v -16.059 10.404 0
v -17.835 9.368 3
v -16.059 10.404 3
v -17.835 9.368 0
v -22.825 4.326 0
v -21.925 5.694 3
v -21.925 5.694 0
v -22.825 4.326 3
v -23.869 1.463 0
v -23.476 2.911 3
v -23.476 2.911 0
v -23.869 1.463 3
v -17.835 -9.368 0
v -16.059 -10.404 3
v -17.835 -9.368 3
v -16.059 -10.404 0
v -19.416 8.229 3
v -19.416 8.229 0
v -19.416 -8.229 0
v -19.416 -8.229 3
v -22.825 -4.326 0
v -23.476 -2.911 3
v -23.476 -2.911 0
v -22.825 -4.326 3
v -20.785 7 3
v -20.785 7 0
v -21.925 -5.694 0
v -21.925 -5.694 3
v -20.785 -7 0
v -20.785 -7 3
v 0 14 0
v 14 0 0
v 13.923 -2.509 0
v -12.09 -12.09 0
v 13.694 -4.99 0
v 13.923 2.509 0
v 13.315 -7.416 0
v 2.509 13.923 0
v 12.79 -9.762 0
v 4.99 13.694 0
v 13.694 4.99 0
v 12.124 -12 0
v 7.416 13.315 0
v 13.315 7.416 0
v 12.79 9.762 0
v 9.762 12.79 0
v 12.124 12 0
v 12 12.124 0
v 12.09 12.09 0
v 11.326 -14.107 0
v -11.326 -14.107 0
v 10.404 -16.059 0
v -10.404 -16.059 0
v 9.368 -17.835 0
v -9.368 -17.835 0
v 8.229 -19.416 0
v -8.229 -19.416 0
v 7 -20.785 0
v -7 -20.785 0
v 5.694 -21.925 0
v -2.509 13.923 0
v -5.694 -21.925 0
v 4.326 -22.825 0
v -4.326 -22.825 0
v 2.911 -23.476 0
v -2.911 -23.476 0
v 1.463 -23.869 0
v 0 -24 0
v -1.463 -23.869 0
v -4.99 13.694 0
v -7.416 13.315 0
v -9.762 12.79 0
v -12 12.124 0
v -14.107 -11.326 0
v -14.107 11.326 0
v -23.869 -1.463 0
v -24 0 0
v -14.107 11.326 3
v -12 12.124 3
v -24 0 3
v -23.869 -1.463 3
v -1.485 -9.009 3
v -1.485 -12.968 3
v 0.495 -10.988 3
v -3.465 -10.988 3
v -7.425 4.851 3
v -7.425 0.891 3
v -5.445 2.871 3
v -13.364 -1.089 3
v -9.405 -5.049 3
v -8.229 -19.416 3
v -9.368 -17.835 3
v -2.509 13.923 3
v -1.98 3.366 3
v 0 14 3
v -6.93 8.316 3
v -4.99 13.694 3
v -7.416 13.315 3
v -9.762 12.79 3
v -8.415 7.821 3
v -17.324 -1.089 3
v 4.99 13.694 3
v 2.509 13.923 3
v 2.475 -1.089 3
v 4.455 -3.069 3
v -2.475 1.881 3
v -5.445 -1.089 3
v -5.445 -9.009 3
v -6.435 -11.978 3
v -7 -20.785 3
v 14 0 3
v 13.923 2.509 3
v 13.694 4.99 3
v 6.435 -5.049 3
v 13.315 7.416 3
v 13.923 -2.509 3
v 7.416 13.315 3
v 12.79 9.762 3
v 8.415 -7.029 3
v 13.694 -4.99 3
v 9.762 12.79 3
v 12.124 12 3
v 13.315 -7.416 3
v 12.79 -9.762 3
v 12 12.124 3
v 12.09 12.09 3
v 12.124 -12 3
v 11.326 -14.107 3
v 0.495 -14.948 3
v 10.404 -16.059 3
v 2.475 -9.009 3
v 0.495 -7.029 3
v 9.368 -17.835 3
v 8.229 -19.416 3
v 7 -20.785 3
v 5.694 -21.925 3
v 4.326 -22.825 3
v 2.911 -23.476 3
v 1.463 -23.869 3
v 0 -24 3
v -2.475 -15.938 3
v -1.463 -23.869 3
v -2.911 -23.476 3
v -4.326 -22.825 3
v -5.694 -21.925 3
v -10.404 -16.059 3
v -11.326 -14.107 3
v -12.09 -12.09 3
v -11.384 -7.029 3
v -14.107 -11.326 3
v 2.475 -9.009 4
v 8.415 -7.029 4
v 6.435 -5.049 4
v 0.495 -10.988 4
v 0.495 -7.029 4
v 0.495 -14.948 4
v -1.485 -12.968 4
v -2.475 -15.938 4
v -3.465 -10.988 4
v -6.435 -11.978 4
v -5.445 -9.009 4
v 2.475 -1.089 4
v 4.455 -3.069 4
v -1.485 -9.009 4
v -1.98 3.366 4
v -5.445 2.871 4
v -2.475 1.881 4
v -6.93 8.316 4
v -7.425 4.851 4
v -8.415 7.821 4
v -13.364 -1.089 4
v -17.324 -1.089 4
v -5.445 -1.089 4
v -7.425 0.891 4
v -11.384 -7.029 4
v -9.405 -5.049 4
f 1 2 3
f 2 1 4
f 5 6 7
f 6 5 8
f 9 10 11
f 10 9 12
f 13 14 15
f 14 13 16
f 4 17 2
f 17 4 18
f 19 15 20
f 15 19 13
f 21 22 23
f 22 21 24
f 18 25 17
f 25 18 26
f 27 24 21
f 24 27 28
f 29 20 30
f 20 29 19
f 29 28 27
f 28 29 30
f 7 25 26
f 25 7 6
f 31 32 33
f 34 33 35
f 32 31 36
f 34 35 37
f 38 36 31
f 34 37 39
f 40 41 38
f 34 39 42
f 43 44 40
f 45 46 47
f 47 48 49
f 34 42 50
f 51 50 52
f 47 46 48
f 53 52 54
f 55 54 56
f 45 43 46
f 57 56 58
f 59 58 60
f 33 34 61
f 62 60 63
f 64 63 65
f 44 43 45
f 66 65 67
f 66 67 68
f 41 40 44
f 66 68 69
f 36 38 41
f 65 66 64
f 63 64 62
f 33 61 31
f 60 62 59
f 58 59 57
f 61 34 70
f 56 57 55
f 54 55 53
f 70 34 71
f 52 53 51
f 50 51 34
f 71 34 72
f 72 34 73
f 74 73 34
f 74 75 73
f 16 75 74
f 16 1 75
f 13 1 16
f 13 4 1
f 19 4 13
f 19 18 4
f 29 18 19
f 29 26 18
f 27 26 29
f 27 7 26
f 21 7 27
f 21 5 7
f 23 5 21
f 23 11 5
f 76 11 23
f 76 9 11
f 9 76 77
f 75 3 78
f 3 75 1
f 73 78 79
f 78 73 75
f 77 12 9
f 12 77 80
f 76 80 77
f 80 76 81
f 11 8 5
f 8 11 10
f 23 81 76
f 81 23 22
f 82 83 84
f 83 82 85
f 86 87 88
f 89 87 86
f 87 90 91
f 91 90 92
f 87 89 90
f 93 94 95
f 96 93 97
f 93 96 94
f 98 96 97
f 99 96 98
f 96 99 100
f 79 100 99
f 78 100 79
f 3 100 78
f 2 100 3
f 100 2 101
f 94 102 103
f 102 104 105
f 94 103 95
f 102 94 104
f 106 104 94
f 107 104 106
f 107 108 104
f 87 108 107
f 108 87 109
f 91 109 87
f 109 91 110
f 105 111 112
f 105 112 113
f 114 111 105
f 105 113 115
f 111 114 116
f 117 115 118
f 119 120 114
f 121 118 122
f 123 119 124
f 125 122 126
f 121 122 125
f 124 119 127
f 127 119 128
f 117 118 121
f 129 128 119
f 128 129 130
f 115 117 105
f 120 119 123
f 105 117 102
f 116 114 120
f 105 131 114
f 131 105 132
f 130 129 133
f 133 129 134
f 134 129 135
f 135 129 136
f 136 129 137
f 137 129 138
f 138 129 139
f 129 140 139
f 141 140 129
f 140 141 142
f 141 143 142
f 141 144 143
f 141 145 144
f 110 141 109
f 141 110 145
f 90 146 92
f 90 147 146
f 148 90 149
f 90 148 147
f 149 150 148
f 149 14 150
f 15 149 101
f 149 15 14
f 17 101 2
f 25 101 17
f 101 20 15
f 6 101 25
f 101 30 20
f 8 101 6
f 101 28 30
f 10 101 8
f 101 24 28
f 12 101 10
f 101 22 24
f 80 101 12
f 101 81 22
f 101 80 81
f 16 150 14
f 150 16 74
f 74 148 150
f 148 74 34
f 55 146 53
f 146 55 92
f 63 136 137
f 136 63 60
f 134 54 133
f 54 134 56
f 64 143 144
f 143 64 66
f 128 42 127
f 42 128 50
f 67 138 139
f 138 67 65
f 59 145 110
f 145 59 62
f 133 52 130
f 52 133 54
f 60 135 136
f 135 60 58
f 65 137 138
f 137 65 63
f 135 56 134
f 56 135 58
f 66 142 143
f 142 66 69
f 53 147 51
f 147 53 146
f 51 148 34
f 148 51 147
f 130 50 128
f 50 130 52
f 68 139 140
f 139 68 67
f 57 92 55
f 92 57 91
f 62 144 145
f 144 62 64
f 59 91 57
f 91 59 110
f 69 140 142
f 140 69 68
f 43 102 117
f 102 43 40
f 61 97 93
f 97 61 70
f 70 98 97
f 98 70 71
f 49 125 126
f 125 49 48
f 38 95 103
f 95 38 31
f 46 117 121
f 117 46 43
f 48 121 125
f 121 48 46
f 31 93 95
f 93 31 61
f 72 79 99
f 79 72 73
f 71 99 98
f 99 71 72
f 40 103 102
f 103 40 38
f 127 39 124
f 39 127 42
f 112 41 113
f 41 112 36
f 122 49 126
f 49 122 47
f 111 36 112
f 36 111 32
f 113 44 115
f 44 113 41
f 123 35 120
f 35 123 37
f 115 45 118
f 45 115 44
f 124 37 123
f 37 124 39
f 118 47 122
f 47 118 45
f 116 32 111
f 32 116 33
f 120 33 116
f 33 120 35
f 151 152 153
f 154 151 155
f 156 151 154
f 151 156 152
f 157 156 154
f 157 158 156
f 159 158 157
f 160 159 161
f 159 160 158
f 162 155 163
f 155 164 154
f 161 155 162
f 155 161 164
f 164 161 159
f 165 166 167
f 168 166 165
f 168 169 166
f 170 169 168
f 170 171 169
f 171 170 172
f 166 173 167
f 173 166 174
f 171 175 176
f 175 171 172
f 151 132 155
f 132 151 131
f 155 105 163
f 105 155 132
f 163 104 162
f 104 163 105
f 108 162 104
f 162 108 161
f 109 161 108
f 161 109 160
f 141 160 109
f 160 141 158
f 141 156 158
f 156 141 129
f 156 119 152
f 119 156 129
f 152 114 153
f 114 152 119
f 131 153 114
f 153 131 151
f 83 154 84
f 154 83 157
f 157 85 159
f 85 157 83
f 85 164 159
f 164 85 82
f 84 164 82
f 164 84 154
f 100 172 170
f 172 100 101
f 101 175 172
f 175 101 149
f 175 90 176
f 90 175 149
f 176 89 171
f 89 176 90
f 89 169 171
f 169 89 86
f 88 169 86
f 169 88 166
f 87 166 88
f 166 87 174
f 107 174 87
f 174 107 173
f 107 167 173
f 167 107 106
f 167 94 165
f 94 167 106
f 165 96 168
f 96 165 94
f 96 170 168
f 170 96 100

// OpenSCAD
// Initialed Heart Ornament
// By Jake Poznanski
// preview[view:north east, tilt:top]

//Enter your two letter initials
initials = "AJ"; 

//The height of the main heart body in mm
height = 3; // [3:10]

//The height of the letters themselves
letter_height = 1; // [1:5]

//Internal variables
heartAngle = 90*1;
size = 14*1;
ratio = 48/28;
elipseSize = [size * ratio,size,height];

//Importing this module directly for Makerbot customizer script
// Spiff Sans
// Author: Stuart P. Bentley <stuart@testtrack4.com>

module spiffsans_puts(letters, count, offsets)
{
  for(i=[0:count-1])
  {
    translate([offsets[i],0,0])
    {
      spiffsans_lookup_draw(letters[i]);
    }
  }
}

module spiffsans_lookup_draw(char)
{
  if(char==" ") {} //silly lookup, space can't be printed
  else if(char =="!") spiffsans_exclaim();
  else if(char =="-") spiffsans_hyphen();
  else if(char ==".") spiffsans_period();
  else if(char =="0") spiffsans_digit_0();
  else if(char =="1") spiffsans_digit_1();
  else if(char =="2") spiffsans_digit_2();
  else if(char =="3") spiffsans_digit_3();
  else if(char =="4") spiffsans_digit_4();
  else if(char =="5") spiffsans_digit_5();
  else if(char =="6") spiffsans_digit_6();
  else if(char =="7") spiffsans_digit_7();
  else if(char =="8") spiffsans_digit_8();
  else if(char =="9") spiffsans_digit_9();
  else if(char ==":") spiffsans_colon();
  else if(char =="?") spiffsans_question();
  else if(char =="A" || char == "a") spiffsans_capital_a();
  else if(char =="B" || char == "b") spiffsans_capital_b();
  else if(char =="C" || char == "c") spiffsans_capital_c();
  else if(char =="D" || char == "d") spiffsans_capital_d();
  else if(char =="E" || char == "e") spiffsans_capital_e();
  else if(char =="F" || char == "f") spiffsans_capital_f();
  else if(char =="G" || char == "g") spiffsans_capital_g();
  else if(char =="H" || char == "h") spiffsans_capital_h();
  else if(char =="I" || char == "i") spiffsans_capital_i();
  else if(char =="J" || char == "j") spiffsans_capital_j();
  else if(char =="K" || char == "k") spiffsans_capital_k();
  else if(char =="L" || char == "l") spiffsans_capital_l();
  else if(char =="M" || char == "m") spiffsans_capital_m();
  else if(char =="N" || char == "n") spiffsans_capital_n();
  else if(char =="O" || char == "o") spiffsans_capital_o();
  else if(char =="P" || char == "p") spiffsans_capital_p();
  else if(char =="Q" || char == "q") spiffsans_capital_q();
  else if(char =="R" || char == "r") spiffsans_capital_r();
  else if(char =="S" || char == "s") spiffsans_capital_s();
  else if(char =="T" || char == "t") spiffsans_capital_t();
  else if(char =="U" || char == "u") spiffsans_capital_u();
  else if(char =="V" || char == "v") spiffsans_capital_v();
  else if(char =="W" || char == "w") spiffsans_capital_w();
  else if(char =="X" || char == "x") spiffsans_capital_x();
  else if(char =="Y" || char == "y") spiffsans_capital_y();
  else if(char =="Z" || char == "z") spiffsans_capital_z();
  else echo(str("Unknown character: ", char));
}

module spiffsans_exclaim()
{
  polygon(points=[[0,3],[0,10],[2,10],[2,3],[0,0],[0,2],[2,2],[2,0]],paths=[[0,1,2,3],[4,5,6,7]]);
}

module spiffsans_hyphen()
{
  polygon(points=[[0,4],[0,6],[4,6],[4,4]],paths=[[0,1,2,3]]);
}

module spiffsans_period()
{
  polygon(points=[[0,0],[0,2],[2,2],[2,0]],paths=[[0,1,2,3]]);
}

module spiffsans_digit_0()
{
  polygon(points=[[5,0],[1,0],[0,2],[0,8],[1,10],[5,10],[6,8],[6,2],[2,8],[4,8],[2,5],[2,2],[4,5],[4,2]],paths=[[0,1,2,3,4,5,6,7],[8,9,10],[11,12,13]]);
}

module spiffsans_digit_1()
{
  polygon(points=[[0,0],[0,2],[2,2],[2,7],[0,7],[2,10],[4,10],[4,2],[5,2],[5,0]],paths=[[0,1,2,3,4,5,6,7,8,9]]);
}

module spiffsans_digit_2()
{
  polygon(points=[[0,0],[0,2],[4,6],[4,8],[2,8],[2,6],[0,6],[0,8],[1,10],[5,10],[6,8],[6,5.5],[2.5,2],[6,2],[6,0]],paths=[[0,1,2,3,4,5,6,7,8,9,10,11,12,13,14]]);
}

module spiffsans_digit_3()
{
  polygon(points=[[1,0],[0,2],[0,4],[2,4],[2,2],[4,2],[4,4],[3,4],[3,6],[4,6],[4,8],[2,8],[2,6],[0,6],[0,8],[1,10],[5,10],[6,8],[6,6],[5.5,5],[6,4],[6,2],[5,0]],paths=[[0,1,2,3,4,5,6,7,8,9,10,11,12,13,14,15,16,17,18,19,20,21,22]]);
}

module spiffsans_digit_4()
{
  polygon(points=[[4,0],[4,4],[0,4],[0,10],[2,10],[2,6],[4,6],[4,10],[6,10],[6,0]],paths=[[0,1,2,3,4,5,6,7,8,9]]);
}

module spiffsans_digit_5()
{
  polygon(points=[[0,0],[0,2],[4,2],[4.5,3],[4,4],[0,4],[0,10],[6,10],[6,8],[2,8],[2,6],[5,6],[6,4],[6,2],[5,0]],paths=[[0,1,2,3,4,5,6,7,8,9,10,11,12,13,14]]);
}

module spiffsans_digit_6()
{
  polygon(points=[[1,0],[0,2],[0,8],[1,10],[5,10],[5.5,8],[2,8],[2,6],[5,6],[6,4],[6,2],[5,0],[2,2],[2,4],[4,4],[4,2]],paths=[[0,1,2,3,4,5,6,7,8,9,10,11],[12,13,14,15]]);
}

module spiffsans_digit_7()
{
  polygon(points=[[1,0],[1,3],[3,8],[0,8],[0,10],[5,10],[5,8],[3,3],[3,0]],paths=[[0,1,2,3,4,5,6,7,8]]);
}

module spiffsans_digit_8()
{
  polygon(points=[[1,0],[0,2],[0,4],[0.5,5],[0,6],[0,8],[1,10],[5,10],[6,8],[6,6],[5.5,5],[6,4],[6,2],[5,0],[2,6],[2,8],[4,8],[4,6],[2,2],[2,4],[4,4],[4,2]],paths=[[0,1,2,3,4,5,6,7,8,9,10,11,12,13],[14,15,16,17],[18,19,20,21]]);
}

module spiffsans_digit_9()
{
  polygon(points=[[1,0],[0,2],[4,2],[4,4],[1,4],[0,6],[0,8],[1,10],[5,10],[6,8],[6,2],[5,0],[2,6],[2,8],[4,8],[4,6]],paths=[[0,1,2,3,4,5,6,7,8,9,10,11],[12,13,14,15]]);
}

module spiffsans_colon()
{
  polygon(points=[[0,6],[0,8],[2,8],[2,6],[0,2],[0,4],[2,4],[2,2]],paths=[[0,1,2,3],[4,5,6,7]]);
}

module spiffsans_question()
{
  polygon(points=[[2,3],[4,6],[4,8],[2,8],[2,6],[0,6],[0,8],[2,10],[4,10],[6,8],[6,6],[4,3],[2,0],[2,2],[4,2],[4,0]],paths=[[0,1,2,3,4,5,6,7,8,9,10,11],[12,13,14,15]]);
}

module spiffsans_capital_a()
{
  polygon(points=[[0,0],[0,8],[1,10],[5,10],[6,8],[6,0],[4,0],[4,4],[2,4],[2,0],[2,6],[2,8],[4,8],[4,6]],paths=[[0,1,2,3,4,5,6,7,8,9],[10,11,12,13]]);
}

module spiffsans_capital_b()
{
  polygon(points=[[0,0],[0,10],[5,10],[6,8],[6,6],[5.5,5],[6,4],[6,2],[5,0],[2,6],[2,8],[4,8],[4,6],[2,2],[2,4],[4,4],[4,2]],paths=[[0,1,2,3,4,5,6,7,8],[9,10,11,12],[13,14,15,16]]);
}

module spiffsans_capital_c()
{
  polygon(points=[[6,0],[1,0],[0,2],[0,8],[1,10],[6,10],[6,8],[2,8],[2,2],[6,2]],paths=[[0,1,2,3,4,5,6,7,8,9]]);
}

module spiffsans_capital_d()
{
  polygon(points=[[0,0],[0,10],[5,10],[6,8],[6,2],[5,0],[2,2],[2,8],[4,8],[4,2]],paths=[[0,1,2,3,4,5],[6,7,8,9]]);
}

module spiffsans_capital_e()
{
  polygon(points=[[0,0],[0,10],[5,10],[5,8],[2,8],[2,6],[4,6],[4,4],[2,4],[2,2],[5,2],[5,0]],paths=[[0,1,2,3,4,5,6,7,8,9,10,11]]);
}

module spiffsans_capital_f()
{
  polygon(points=[[0,0],[0,10],[5,10],[5,8],[2,8],[2,6],[4,6],[4,4],[2,4],[2,0]],paths=[[0,1,2,3,4,5,6,7,8,9]]);
}

module spiffsans_capital_g()
{
  polygon(points=[[6,0],[1,0],[0,2],[0,8],[1,10],[5.5,10],[6,8],[2,8],[2,2],[4,2],[4,6],[6,6]],paths=[[0,1,2,3,4,5,6,7,8,9,10,11]]);
}

module spiffsans_capital_h()
{
  polygon(points=[[0,0],[0,10],[2,10],[2,6],[4,6],[4,10],[6,10],[6,0],[4,0],[4,4],[2,4],[2,0]],paths=[[0,1,2,3,4,5,6,7,8,9,10,11]]);
}

module spiffsans_capital_i()
{
  polygon(points=[[0,0],[0,2],[1.5,2],[1.5,8],[0,8],[0,10],[5,10],[5,8],[3.5,8],[3.5,2],[5,2],[5,0]],paths=[[0,1,2,3,4,5,6,7,8,9,10,11]]);
}

module spiffsans_capital_j()
{
  polygon(points=[[0.5,0],[0,1],[0,4],[2,4],[2,2],[4,2],[4,8],[0,8],[0,10],[6,10],[6,1],[5.5,0]],paths=[[0,1,2,3,4,5,6,7,8,9,10,11]]);
}

module spiffsans_capital_k()
{
  polygon(points=[[0,0],[0,10],[2,10],[2,6],[4,6],[4,10],[6,10],[6,6],[5,5],[6,4],[6,0],[4,0],[4,4],[2,4],[2,0]],paths=[[0,1,2,3,4,5,6,7,8,9,10,11,12,13,14]]);
}

module spiffsans_capital_l()
{
  polygon(points=[[0,0],[0,10],[2,10],[2,2],[5,2],[5,0]],paths=[[0,1,2,3,4,5]]);
}

module spiffsans_capital_m()
{
  polygon(points=[[0,0],[0,8],[1,10],[9,10],[10,8],[10,0],[8,0],[8,8],[6,8],[6,0],[4,0],[4,8],[2,8],[2,0]],paths=[[0,1,2,3,4,5,6,7,8,9,10,11,12,13]]);
}

module spiffsans_capital_n()
{
  polygon(points=[[0,0],[0,8],[1,10],[5,10],[6,8],[6,0],[4,0],[4,8],[2,8],[2,0]],paths=[[0,1,2,3,4,5,6,7,8,9]]);
}

module spiffsans_capital_o()
{
  polygon(points=[[5,0],[1,0],[0,2],[0,8],[1,10],[5,10],[6,8],[6,2],[2,2],[2,8],[4,8],[4,2]],paths=[[0,1,2,3,4,5,6,7],[8,9,10,11]]);
}

module spiffsans_capital_p()
{
  polygon(points=[[0,0],[0,10],[5,10],[6,8],[6,6],[5,4],[2,4],[2,0],[2,6],[2,8],[4,8],[4,6]],paths=[[0,1,2,3,4,5,6,7],[8,9,10,11]]);
}

module spiffsans_capital_q()
{
  polygon(points=[[1,0],[0,2],[0,8],[1,10],[5,10],[6,8],[6,0],[2,2],[2,8],[4,8],[4,2]],paths=[[0,1,2,3,4,5,6],[7,8,9,10]]);
}

module spiffsans_capital_r()
{
  polygon(points=[[0,0],[0,10],[5,10],[6,8],[6,6],[5.5,5],[6,4],[6,0],[4,0],[4,4],[2,4],[2,0],[2,6],[2,8],[4,8],[4,6]],paths=[[0,1,2,3,4,5,6,7,8,9,10,11],[12,13,14,15]]);
}

module spiffsans_capital_s()
{
  polygon(points=[[1,0],[0,2],[0,3],[2,3],[2,2],[4,2],[4,4],[1,4],[0,5],[0,8],[1,10],[5,10],[6,8],[6,7],[4,7],[4,8],[2,8],[2,6],[5,6],[6,5],[6,2],[5,0]],paths=[[0,1,2,3,4,5,6,7,8,9,10,11,12,13,14,15,16,17,18,19,20,21]]);
}

module spiffsans_capital_t()
{
  polygon(points=[[2,0],[2,8],[0,8],[0,10],[6,10],[6,8],[4,8],[4,0]],paths=[[0,1,2,3,4,5,6,7]]);
}

module spiffsans_capital_u()
{
  polygon(points=[[1,0],[0,2],[0,10],[2,10],[2,2],[4,2],[4,10],[6,10],[6,2],[5,0]],paths=[[0,1,2,3,4,5,6,7,8,9]]);
}

module spiffsans_capital_v()
{
  polygon(points=[[2,0],[0,4],[0,10],[2,10],[2,4],[4,4],[4,10],[6,10],[6,4],[4,0]],paths=[[0,1,2,3,4,5,6,7,8,9]]);
}

module spiffsans_capital_w()
{
  polygon(points=[[9,0],[1,0],[0,2],[0,10],[2,10],[2,2],[4,2],[4,10],[6,10],[6,2],[8,2],[8,10],[10,10],[10,2]],paths=[[0,1,2,3,4,5,6,7,8,9,10,11,12,13]]);
}

module spiffsans_capital_x()
{
  polygon(points=[[0,0],[0,4],[1,5],[0,6],[0,10],[2,10],[2,6],[4,6],[4,10],[6,10],[6,6],[5,5],[6,4],[6,0],[4,0],[4,4],[2,4],[2,0]],paths=[[0,1,2,3,4,5,6,7,8,9,10,11,12,13,14,15,16,17]]);
}

module spiffsans_capital_y()
{
  polygon(points=[[2,0],[2,4],[1,4],[0,6],[0,10],[2,10],[2,6],[4,6],[4,10],[6,10],[6,6],[5,4],[4,4],[4,0]],paths=[[0,1,2,3,4,5,6,7,8,9,10,11,12,13]]);
}

module spiffsans_capital_z()
{
  polygon(points=[[0,0],[0,2],[3,8],[0,8],[0,10],[5,10],[5,8],[2,2],[5,2],[5,0]],paths=[[0,1,2,3,4,5,6,7,8,9]]);
}


union()
{

translate([0,0,height])
scale([size/10,size/10,1])
linear_extrude(height=letter_height)
rotate(heartAngle+(90-heartAngle)/2+45)
translate([-2.0*(size/10)-5, -size/20,0])
spiffsans_puts(initials, 2, [0,10]);

union(){
intersection(){

union(){
scale(elipseSize)
cylinder(h = 1, r = 1,$fn=60);

rotate(heartAngle)
scale(elipseSize)
cylinder(h = 1, r = 1,$fn=60);
}

rotate(heartAngle+(90-heartAngle)/2+45)
translate([-elipseSize.x,0,-height/2])
cube(size = elipseSize*2);
}

intersection(){

intersection(){
scale(elipseSize)
cylinder(h = 1, r = 1,$fn=60);

rotate(heartAngle)
scale(elipseSize)
cylinder(h = 1, r = 1,$fn=60);
}

rotate(heartAngle+(90-heartAngle)/2+45)
translate([-elipseSize.x,-elipseSize.x,-height/2])
cube(size = elipseSize*2);
}
}


}
